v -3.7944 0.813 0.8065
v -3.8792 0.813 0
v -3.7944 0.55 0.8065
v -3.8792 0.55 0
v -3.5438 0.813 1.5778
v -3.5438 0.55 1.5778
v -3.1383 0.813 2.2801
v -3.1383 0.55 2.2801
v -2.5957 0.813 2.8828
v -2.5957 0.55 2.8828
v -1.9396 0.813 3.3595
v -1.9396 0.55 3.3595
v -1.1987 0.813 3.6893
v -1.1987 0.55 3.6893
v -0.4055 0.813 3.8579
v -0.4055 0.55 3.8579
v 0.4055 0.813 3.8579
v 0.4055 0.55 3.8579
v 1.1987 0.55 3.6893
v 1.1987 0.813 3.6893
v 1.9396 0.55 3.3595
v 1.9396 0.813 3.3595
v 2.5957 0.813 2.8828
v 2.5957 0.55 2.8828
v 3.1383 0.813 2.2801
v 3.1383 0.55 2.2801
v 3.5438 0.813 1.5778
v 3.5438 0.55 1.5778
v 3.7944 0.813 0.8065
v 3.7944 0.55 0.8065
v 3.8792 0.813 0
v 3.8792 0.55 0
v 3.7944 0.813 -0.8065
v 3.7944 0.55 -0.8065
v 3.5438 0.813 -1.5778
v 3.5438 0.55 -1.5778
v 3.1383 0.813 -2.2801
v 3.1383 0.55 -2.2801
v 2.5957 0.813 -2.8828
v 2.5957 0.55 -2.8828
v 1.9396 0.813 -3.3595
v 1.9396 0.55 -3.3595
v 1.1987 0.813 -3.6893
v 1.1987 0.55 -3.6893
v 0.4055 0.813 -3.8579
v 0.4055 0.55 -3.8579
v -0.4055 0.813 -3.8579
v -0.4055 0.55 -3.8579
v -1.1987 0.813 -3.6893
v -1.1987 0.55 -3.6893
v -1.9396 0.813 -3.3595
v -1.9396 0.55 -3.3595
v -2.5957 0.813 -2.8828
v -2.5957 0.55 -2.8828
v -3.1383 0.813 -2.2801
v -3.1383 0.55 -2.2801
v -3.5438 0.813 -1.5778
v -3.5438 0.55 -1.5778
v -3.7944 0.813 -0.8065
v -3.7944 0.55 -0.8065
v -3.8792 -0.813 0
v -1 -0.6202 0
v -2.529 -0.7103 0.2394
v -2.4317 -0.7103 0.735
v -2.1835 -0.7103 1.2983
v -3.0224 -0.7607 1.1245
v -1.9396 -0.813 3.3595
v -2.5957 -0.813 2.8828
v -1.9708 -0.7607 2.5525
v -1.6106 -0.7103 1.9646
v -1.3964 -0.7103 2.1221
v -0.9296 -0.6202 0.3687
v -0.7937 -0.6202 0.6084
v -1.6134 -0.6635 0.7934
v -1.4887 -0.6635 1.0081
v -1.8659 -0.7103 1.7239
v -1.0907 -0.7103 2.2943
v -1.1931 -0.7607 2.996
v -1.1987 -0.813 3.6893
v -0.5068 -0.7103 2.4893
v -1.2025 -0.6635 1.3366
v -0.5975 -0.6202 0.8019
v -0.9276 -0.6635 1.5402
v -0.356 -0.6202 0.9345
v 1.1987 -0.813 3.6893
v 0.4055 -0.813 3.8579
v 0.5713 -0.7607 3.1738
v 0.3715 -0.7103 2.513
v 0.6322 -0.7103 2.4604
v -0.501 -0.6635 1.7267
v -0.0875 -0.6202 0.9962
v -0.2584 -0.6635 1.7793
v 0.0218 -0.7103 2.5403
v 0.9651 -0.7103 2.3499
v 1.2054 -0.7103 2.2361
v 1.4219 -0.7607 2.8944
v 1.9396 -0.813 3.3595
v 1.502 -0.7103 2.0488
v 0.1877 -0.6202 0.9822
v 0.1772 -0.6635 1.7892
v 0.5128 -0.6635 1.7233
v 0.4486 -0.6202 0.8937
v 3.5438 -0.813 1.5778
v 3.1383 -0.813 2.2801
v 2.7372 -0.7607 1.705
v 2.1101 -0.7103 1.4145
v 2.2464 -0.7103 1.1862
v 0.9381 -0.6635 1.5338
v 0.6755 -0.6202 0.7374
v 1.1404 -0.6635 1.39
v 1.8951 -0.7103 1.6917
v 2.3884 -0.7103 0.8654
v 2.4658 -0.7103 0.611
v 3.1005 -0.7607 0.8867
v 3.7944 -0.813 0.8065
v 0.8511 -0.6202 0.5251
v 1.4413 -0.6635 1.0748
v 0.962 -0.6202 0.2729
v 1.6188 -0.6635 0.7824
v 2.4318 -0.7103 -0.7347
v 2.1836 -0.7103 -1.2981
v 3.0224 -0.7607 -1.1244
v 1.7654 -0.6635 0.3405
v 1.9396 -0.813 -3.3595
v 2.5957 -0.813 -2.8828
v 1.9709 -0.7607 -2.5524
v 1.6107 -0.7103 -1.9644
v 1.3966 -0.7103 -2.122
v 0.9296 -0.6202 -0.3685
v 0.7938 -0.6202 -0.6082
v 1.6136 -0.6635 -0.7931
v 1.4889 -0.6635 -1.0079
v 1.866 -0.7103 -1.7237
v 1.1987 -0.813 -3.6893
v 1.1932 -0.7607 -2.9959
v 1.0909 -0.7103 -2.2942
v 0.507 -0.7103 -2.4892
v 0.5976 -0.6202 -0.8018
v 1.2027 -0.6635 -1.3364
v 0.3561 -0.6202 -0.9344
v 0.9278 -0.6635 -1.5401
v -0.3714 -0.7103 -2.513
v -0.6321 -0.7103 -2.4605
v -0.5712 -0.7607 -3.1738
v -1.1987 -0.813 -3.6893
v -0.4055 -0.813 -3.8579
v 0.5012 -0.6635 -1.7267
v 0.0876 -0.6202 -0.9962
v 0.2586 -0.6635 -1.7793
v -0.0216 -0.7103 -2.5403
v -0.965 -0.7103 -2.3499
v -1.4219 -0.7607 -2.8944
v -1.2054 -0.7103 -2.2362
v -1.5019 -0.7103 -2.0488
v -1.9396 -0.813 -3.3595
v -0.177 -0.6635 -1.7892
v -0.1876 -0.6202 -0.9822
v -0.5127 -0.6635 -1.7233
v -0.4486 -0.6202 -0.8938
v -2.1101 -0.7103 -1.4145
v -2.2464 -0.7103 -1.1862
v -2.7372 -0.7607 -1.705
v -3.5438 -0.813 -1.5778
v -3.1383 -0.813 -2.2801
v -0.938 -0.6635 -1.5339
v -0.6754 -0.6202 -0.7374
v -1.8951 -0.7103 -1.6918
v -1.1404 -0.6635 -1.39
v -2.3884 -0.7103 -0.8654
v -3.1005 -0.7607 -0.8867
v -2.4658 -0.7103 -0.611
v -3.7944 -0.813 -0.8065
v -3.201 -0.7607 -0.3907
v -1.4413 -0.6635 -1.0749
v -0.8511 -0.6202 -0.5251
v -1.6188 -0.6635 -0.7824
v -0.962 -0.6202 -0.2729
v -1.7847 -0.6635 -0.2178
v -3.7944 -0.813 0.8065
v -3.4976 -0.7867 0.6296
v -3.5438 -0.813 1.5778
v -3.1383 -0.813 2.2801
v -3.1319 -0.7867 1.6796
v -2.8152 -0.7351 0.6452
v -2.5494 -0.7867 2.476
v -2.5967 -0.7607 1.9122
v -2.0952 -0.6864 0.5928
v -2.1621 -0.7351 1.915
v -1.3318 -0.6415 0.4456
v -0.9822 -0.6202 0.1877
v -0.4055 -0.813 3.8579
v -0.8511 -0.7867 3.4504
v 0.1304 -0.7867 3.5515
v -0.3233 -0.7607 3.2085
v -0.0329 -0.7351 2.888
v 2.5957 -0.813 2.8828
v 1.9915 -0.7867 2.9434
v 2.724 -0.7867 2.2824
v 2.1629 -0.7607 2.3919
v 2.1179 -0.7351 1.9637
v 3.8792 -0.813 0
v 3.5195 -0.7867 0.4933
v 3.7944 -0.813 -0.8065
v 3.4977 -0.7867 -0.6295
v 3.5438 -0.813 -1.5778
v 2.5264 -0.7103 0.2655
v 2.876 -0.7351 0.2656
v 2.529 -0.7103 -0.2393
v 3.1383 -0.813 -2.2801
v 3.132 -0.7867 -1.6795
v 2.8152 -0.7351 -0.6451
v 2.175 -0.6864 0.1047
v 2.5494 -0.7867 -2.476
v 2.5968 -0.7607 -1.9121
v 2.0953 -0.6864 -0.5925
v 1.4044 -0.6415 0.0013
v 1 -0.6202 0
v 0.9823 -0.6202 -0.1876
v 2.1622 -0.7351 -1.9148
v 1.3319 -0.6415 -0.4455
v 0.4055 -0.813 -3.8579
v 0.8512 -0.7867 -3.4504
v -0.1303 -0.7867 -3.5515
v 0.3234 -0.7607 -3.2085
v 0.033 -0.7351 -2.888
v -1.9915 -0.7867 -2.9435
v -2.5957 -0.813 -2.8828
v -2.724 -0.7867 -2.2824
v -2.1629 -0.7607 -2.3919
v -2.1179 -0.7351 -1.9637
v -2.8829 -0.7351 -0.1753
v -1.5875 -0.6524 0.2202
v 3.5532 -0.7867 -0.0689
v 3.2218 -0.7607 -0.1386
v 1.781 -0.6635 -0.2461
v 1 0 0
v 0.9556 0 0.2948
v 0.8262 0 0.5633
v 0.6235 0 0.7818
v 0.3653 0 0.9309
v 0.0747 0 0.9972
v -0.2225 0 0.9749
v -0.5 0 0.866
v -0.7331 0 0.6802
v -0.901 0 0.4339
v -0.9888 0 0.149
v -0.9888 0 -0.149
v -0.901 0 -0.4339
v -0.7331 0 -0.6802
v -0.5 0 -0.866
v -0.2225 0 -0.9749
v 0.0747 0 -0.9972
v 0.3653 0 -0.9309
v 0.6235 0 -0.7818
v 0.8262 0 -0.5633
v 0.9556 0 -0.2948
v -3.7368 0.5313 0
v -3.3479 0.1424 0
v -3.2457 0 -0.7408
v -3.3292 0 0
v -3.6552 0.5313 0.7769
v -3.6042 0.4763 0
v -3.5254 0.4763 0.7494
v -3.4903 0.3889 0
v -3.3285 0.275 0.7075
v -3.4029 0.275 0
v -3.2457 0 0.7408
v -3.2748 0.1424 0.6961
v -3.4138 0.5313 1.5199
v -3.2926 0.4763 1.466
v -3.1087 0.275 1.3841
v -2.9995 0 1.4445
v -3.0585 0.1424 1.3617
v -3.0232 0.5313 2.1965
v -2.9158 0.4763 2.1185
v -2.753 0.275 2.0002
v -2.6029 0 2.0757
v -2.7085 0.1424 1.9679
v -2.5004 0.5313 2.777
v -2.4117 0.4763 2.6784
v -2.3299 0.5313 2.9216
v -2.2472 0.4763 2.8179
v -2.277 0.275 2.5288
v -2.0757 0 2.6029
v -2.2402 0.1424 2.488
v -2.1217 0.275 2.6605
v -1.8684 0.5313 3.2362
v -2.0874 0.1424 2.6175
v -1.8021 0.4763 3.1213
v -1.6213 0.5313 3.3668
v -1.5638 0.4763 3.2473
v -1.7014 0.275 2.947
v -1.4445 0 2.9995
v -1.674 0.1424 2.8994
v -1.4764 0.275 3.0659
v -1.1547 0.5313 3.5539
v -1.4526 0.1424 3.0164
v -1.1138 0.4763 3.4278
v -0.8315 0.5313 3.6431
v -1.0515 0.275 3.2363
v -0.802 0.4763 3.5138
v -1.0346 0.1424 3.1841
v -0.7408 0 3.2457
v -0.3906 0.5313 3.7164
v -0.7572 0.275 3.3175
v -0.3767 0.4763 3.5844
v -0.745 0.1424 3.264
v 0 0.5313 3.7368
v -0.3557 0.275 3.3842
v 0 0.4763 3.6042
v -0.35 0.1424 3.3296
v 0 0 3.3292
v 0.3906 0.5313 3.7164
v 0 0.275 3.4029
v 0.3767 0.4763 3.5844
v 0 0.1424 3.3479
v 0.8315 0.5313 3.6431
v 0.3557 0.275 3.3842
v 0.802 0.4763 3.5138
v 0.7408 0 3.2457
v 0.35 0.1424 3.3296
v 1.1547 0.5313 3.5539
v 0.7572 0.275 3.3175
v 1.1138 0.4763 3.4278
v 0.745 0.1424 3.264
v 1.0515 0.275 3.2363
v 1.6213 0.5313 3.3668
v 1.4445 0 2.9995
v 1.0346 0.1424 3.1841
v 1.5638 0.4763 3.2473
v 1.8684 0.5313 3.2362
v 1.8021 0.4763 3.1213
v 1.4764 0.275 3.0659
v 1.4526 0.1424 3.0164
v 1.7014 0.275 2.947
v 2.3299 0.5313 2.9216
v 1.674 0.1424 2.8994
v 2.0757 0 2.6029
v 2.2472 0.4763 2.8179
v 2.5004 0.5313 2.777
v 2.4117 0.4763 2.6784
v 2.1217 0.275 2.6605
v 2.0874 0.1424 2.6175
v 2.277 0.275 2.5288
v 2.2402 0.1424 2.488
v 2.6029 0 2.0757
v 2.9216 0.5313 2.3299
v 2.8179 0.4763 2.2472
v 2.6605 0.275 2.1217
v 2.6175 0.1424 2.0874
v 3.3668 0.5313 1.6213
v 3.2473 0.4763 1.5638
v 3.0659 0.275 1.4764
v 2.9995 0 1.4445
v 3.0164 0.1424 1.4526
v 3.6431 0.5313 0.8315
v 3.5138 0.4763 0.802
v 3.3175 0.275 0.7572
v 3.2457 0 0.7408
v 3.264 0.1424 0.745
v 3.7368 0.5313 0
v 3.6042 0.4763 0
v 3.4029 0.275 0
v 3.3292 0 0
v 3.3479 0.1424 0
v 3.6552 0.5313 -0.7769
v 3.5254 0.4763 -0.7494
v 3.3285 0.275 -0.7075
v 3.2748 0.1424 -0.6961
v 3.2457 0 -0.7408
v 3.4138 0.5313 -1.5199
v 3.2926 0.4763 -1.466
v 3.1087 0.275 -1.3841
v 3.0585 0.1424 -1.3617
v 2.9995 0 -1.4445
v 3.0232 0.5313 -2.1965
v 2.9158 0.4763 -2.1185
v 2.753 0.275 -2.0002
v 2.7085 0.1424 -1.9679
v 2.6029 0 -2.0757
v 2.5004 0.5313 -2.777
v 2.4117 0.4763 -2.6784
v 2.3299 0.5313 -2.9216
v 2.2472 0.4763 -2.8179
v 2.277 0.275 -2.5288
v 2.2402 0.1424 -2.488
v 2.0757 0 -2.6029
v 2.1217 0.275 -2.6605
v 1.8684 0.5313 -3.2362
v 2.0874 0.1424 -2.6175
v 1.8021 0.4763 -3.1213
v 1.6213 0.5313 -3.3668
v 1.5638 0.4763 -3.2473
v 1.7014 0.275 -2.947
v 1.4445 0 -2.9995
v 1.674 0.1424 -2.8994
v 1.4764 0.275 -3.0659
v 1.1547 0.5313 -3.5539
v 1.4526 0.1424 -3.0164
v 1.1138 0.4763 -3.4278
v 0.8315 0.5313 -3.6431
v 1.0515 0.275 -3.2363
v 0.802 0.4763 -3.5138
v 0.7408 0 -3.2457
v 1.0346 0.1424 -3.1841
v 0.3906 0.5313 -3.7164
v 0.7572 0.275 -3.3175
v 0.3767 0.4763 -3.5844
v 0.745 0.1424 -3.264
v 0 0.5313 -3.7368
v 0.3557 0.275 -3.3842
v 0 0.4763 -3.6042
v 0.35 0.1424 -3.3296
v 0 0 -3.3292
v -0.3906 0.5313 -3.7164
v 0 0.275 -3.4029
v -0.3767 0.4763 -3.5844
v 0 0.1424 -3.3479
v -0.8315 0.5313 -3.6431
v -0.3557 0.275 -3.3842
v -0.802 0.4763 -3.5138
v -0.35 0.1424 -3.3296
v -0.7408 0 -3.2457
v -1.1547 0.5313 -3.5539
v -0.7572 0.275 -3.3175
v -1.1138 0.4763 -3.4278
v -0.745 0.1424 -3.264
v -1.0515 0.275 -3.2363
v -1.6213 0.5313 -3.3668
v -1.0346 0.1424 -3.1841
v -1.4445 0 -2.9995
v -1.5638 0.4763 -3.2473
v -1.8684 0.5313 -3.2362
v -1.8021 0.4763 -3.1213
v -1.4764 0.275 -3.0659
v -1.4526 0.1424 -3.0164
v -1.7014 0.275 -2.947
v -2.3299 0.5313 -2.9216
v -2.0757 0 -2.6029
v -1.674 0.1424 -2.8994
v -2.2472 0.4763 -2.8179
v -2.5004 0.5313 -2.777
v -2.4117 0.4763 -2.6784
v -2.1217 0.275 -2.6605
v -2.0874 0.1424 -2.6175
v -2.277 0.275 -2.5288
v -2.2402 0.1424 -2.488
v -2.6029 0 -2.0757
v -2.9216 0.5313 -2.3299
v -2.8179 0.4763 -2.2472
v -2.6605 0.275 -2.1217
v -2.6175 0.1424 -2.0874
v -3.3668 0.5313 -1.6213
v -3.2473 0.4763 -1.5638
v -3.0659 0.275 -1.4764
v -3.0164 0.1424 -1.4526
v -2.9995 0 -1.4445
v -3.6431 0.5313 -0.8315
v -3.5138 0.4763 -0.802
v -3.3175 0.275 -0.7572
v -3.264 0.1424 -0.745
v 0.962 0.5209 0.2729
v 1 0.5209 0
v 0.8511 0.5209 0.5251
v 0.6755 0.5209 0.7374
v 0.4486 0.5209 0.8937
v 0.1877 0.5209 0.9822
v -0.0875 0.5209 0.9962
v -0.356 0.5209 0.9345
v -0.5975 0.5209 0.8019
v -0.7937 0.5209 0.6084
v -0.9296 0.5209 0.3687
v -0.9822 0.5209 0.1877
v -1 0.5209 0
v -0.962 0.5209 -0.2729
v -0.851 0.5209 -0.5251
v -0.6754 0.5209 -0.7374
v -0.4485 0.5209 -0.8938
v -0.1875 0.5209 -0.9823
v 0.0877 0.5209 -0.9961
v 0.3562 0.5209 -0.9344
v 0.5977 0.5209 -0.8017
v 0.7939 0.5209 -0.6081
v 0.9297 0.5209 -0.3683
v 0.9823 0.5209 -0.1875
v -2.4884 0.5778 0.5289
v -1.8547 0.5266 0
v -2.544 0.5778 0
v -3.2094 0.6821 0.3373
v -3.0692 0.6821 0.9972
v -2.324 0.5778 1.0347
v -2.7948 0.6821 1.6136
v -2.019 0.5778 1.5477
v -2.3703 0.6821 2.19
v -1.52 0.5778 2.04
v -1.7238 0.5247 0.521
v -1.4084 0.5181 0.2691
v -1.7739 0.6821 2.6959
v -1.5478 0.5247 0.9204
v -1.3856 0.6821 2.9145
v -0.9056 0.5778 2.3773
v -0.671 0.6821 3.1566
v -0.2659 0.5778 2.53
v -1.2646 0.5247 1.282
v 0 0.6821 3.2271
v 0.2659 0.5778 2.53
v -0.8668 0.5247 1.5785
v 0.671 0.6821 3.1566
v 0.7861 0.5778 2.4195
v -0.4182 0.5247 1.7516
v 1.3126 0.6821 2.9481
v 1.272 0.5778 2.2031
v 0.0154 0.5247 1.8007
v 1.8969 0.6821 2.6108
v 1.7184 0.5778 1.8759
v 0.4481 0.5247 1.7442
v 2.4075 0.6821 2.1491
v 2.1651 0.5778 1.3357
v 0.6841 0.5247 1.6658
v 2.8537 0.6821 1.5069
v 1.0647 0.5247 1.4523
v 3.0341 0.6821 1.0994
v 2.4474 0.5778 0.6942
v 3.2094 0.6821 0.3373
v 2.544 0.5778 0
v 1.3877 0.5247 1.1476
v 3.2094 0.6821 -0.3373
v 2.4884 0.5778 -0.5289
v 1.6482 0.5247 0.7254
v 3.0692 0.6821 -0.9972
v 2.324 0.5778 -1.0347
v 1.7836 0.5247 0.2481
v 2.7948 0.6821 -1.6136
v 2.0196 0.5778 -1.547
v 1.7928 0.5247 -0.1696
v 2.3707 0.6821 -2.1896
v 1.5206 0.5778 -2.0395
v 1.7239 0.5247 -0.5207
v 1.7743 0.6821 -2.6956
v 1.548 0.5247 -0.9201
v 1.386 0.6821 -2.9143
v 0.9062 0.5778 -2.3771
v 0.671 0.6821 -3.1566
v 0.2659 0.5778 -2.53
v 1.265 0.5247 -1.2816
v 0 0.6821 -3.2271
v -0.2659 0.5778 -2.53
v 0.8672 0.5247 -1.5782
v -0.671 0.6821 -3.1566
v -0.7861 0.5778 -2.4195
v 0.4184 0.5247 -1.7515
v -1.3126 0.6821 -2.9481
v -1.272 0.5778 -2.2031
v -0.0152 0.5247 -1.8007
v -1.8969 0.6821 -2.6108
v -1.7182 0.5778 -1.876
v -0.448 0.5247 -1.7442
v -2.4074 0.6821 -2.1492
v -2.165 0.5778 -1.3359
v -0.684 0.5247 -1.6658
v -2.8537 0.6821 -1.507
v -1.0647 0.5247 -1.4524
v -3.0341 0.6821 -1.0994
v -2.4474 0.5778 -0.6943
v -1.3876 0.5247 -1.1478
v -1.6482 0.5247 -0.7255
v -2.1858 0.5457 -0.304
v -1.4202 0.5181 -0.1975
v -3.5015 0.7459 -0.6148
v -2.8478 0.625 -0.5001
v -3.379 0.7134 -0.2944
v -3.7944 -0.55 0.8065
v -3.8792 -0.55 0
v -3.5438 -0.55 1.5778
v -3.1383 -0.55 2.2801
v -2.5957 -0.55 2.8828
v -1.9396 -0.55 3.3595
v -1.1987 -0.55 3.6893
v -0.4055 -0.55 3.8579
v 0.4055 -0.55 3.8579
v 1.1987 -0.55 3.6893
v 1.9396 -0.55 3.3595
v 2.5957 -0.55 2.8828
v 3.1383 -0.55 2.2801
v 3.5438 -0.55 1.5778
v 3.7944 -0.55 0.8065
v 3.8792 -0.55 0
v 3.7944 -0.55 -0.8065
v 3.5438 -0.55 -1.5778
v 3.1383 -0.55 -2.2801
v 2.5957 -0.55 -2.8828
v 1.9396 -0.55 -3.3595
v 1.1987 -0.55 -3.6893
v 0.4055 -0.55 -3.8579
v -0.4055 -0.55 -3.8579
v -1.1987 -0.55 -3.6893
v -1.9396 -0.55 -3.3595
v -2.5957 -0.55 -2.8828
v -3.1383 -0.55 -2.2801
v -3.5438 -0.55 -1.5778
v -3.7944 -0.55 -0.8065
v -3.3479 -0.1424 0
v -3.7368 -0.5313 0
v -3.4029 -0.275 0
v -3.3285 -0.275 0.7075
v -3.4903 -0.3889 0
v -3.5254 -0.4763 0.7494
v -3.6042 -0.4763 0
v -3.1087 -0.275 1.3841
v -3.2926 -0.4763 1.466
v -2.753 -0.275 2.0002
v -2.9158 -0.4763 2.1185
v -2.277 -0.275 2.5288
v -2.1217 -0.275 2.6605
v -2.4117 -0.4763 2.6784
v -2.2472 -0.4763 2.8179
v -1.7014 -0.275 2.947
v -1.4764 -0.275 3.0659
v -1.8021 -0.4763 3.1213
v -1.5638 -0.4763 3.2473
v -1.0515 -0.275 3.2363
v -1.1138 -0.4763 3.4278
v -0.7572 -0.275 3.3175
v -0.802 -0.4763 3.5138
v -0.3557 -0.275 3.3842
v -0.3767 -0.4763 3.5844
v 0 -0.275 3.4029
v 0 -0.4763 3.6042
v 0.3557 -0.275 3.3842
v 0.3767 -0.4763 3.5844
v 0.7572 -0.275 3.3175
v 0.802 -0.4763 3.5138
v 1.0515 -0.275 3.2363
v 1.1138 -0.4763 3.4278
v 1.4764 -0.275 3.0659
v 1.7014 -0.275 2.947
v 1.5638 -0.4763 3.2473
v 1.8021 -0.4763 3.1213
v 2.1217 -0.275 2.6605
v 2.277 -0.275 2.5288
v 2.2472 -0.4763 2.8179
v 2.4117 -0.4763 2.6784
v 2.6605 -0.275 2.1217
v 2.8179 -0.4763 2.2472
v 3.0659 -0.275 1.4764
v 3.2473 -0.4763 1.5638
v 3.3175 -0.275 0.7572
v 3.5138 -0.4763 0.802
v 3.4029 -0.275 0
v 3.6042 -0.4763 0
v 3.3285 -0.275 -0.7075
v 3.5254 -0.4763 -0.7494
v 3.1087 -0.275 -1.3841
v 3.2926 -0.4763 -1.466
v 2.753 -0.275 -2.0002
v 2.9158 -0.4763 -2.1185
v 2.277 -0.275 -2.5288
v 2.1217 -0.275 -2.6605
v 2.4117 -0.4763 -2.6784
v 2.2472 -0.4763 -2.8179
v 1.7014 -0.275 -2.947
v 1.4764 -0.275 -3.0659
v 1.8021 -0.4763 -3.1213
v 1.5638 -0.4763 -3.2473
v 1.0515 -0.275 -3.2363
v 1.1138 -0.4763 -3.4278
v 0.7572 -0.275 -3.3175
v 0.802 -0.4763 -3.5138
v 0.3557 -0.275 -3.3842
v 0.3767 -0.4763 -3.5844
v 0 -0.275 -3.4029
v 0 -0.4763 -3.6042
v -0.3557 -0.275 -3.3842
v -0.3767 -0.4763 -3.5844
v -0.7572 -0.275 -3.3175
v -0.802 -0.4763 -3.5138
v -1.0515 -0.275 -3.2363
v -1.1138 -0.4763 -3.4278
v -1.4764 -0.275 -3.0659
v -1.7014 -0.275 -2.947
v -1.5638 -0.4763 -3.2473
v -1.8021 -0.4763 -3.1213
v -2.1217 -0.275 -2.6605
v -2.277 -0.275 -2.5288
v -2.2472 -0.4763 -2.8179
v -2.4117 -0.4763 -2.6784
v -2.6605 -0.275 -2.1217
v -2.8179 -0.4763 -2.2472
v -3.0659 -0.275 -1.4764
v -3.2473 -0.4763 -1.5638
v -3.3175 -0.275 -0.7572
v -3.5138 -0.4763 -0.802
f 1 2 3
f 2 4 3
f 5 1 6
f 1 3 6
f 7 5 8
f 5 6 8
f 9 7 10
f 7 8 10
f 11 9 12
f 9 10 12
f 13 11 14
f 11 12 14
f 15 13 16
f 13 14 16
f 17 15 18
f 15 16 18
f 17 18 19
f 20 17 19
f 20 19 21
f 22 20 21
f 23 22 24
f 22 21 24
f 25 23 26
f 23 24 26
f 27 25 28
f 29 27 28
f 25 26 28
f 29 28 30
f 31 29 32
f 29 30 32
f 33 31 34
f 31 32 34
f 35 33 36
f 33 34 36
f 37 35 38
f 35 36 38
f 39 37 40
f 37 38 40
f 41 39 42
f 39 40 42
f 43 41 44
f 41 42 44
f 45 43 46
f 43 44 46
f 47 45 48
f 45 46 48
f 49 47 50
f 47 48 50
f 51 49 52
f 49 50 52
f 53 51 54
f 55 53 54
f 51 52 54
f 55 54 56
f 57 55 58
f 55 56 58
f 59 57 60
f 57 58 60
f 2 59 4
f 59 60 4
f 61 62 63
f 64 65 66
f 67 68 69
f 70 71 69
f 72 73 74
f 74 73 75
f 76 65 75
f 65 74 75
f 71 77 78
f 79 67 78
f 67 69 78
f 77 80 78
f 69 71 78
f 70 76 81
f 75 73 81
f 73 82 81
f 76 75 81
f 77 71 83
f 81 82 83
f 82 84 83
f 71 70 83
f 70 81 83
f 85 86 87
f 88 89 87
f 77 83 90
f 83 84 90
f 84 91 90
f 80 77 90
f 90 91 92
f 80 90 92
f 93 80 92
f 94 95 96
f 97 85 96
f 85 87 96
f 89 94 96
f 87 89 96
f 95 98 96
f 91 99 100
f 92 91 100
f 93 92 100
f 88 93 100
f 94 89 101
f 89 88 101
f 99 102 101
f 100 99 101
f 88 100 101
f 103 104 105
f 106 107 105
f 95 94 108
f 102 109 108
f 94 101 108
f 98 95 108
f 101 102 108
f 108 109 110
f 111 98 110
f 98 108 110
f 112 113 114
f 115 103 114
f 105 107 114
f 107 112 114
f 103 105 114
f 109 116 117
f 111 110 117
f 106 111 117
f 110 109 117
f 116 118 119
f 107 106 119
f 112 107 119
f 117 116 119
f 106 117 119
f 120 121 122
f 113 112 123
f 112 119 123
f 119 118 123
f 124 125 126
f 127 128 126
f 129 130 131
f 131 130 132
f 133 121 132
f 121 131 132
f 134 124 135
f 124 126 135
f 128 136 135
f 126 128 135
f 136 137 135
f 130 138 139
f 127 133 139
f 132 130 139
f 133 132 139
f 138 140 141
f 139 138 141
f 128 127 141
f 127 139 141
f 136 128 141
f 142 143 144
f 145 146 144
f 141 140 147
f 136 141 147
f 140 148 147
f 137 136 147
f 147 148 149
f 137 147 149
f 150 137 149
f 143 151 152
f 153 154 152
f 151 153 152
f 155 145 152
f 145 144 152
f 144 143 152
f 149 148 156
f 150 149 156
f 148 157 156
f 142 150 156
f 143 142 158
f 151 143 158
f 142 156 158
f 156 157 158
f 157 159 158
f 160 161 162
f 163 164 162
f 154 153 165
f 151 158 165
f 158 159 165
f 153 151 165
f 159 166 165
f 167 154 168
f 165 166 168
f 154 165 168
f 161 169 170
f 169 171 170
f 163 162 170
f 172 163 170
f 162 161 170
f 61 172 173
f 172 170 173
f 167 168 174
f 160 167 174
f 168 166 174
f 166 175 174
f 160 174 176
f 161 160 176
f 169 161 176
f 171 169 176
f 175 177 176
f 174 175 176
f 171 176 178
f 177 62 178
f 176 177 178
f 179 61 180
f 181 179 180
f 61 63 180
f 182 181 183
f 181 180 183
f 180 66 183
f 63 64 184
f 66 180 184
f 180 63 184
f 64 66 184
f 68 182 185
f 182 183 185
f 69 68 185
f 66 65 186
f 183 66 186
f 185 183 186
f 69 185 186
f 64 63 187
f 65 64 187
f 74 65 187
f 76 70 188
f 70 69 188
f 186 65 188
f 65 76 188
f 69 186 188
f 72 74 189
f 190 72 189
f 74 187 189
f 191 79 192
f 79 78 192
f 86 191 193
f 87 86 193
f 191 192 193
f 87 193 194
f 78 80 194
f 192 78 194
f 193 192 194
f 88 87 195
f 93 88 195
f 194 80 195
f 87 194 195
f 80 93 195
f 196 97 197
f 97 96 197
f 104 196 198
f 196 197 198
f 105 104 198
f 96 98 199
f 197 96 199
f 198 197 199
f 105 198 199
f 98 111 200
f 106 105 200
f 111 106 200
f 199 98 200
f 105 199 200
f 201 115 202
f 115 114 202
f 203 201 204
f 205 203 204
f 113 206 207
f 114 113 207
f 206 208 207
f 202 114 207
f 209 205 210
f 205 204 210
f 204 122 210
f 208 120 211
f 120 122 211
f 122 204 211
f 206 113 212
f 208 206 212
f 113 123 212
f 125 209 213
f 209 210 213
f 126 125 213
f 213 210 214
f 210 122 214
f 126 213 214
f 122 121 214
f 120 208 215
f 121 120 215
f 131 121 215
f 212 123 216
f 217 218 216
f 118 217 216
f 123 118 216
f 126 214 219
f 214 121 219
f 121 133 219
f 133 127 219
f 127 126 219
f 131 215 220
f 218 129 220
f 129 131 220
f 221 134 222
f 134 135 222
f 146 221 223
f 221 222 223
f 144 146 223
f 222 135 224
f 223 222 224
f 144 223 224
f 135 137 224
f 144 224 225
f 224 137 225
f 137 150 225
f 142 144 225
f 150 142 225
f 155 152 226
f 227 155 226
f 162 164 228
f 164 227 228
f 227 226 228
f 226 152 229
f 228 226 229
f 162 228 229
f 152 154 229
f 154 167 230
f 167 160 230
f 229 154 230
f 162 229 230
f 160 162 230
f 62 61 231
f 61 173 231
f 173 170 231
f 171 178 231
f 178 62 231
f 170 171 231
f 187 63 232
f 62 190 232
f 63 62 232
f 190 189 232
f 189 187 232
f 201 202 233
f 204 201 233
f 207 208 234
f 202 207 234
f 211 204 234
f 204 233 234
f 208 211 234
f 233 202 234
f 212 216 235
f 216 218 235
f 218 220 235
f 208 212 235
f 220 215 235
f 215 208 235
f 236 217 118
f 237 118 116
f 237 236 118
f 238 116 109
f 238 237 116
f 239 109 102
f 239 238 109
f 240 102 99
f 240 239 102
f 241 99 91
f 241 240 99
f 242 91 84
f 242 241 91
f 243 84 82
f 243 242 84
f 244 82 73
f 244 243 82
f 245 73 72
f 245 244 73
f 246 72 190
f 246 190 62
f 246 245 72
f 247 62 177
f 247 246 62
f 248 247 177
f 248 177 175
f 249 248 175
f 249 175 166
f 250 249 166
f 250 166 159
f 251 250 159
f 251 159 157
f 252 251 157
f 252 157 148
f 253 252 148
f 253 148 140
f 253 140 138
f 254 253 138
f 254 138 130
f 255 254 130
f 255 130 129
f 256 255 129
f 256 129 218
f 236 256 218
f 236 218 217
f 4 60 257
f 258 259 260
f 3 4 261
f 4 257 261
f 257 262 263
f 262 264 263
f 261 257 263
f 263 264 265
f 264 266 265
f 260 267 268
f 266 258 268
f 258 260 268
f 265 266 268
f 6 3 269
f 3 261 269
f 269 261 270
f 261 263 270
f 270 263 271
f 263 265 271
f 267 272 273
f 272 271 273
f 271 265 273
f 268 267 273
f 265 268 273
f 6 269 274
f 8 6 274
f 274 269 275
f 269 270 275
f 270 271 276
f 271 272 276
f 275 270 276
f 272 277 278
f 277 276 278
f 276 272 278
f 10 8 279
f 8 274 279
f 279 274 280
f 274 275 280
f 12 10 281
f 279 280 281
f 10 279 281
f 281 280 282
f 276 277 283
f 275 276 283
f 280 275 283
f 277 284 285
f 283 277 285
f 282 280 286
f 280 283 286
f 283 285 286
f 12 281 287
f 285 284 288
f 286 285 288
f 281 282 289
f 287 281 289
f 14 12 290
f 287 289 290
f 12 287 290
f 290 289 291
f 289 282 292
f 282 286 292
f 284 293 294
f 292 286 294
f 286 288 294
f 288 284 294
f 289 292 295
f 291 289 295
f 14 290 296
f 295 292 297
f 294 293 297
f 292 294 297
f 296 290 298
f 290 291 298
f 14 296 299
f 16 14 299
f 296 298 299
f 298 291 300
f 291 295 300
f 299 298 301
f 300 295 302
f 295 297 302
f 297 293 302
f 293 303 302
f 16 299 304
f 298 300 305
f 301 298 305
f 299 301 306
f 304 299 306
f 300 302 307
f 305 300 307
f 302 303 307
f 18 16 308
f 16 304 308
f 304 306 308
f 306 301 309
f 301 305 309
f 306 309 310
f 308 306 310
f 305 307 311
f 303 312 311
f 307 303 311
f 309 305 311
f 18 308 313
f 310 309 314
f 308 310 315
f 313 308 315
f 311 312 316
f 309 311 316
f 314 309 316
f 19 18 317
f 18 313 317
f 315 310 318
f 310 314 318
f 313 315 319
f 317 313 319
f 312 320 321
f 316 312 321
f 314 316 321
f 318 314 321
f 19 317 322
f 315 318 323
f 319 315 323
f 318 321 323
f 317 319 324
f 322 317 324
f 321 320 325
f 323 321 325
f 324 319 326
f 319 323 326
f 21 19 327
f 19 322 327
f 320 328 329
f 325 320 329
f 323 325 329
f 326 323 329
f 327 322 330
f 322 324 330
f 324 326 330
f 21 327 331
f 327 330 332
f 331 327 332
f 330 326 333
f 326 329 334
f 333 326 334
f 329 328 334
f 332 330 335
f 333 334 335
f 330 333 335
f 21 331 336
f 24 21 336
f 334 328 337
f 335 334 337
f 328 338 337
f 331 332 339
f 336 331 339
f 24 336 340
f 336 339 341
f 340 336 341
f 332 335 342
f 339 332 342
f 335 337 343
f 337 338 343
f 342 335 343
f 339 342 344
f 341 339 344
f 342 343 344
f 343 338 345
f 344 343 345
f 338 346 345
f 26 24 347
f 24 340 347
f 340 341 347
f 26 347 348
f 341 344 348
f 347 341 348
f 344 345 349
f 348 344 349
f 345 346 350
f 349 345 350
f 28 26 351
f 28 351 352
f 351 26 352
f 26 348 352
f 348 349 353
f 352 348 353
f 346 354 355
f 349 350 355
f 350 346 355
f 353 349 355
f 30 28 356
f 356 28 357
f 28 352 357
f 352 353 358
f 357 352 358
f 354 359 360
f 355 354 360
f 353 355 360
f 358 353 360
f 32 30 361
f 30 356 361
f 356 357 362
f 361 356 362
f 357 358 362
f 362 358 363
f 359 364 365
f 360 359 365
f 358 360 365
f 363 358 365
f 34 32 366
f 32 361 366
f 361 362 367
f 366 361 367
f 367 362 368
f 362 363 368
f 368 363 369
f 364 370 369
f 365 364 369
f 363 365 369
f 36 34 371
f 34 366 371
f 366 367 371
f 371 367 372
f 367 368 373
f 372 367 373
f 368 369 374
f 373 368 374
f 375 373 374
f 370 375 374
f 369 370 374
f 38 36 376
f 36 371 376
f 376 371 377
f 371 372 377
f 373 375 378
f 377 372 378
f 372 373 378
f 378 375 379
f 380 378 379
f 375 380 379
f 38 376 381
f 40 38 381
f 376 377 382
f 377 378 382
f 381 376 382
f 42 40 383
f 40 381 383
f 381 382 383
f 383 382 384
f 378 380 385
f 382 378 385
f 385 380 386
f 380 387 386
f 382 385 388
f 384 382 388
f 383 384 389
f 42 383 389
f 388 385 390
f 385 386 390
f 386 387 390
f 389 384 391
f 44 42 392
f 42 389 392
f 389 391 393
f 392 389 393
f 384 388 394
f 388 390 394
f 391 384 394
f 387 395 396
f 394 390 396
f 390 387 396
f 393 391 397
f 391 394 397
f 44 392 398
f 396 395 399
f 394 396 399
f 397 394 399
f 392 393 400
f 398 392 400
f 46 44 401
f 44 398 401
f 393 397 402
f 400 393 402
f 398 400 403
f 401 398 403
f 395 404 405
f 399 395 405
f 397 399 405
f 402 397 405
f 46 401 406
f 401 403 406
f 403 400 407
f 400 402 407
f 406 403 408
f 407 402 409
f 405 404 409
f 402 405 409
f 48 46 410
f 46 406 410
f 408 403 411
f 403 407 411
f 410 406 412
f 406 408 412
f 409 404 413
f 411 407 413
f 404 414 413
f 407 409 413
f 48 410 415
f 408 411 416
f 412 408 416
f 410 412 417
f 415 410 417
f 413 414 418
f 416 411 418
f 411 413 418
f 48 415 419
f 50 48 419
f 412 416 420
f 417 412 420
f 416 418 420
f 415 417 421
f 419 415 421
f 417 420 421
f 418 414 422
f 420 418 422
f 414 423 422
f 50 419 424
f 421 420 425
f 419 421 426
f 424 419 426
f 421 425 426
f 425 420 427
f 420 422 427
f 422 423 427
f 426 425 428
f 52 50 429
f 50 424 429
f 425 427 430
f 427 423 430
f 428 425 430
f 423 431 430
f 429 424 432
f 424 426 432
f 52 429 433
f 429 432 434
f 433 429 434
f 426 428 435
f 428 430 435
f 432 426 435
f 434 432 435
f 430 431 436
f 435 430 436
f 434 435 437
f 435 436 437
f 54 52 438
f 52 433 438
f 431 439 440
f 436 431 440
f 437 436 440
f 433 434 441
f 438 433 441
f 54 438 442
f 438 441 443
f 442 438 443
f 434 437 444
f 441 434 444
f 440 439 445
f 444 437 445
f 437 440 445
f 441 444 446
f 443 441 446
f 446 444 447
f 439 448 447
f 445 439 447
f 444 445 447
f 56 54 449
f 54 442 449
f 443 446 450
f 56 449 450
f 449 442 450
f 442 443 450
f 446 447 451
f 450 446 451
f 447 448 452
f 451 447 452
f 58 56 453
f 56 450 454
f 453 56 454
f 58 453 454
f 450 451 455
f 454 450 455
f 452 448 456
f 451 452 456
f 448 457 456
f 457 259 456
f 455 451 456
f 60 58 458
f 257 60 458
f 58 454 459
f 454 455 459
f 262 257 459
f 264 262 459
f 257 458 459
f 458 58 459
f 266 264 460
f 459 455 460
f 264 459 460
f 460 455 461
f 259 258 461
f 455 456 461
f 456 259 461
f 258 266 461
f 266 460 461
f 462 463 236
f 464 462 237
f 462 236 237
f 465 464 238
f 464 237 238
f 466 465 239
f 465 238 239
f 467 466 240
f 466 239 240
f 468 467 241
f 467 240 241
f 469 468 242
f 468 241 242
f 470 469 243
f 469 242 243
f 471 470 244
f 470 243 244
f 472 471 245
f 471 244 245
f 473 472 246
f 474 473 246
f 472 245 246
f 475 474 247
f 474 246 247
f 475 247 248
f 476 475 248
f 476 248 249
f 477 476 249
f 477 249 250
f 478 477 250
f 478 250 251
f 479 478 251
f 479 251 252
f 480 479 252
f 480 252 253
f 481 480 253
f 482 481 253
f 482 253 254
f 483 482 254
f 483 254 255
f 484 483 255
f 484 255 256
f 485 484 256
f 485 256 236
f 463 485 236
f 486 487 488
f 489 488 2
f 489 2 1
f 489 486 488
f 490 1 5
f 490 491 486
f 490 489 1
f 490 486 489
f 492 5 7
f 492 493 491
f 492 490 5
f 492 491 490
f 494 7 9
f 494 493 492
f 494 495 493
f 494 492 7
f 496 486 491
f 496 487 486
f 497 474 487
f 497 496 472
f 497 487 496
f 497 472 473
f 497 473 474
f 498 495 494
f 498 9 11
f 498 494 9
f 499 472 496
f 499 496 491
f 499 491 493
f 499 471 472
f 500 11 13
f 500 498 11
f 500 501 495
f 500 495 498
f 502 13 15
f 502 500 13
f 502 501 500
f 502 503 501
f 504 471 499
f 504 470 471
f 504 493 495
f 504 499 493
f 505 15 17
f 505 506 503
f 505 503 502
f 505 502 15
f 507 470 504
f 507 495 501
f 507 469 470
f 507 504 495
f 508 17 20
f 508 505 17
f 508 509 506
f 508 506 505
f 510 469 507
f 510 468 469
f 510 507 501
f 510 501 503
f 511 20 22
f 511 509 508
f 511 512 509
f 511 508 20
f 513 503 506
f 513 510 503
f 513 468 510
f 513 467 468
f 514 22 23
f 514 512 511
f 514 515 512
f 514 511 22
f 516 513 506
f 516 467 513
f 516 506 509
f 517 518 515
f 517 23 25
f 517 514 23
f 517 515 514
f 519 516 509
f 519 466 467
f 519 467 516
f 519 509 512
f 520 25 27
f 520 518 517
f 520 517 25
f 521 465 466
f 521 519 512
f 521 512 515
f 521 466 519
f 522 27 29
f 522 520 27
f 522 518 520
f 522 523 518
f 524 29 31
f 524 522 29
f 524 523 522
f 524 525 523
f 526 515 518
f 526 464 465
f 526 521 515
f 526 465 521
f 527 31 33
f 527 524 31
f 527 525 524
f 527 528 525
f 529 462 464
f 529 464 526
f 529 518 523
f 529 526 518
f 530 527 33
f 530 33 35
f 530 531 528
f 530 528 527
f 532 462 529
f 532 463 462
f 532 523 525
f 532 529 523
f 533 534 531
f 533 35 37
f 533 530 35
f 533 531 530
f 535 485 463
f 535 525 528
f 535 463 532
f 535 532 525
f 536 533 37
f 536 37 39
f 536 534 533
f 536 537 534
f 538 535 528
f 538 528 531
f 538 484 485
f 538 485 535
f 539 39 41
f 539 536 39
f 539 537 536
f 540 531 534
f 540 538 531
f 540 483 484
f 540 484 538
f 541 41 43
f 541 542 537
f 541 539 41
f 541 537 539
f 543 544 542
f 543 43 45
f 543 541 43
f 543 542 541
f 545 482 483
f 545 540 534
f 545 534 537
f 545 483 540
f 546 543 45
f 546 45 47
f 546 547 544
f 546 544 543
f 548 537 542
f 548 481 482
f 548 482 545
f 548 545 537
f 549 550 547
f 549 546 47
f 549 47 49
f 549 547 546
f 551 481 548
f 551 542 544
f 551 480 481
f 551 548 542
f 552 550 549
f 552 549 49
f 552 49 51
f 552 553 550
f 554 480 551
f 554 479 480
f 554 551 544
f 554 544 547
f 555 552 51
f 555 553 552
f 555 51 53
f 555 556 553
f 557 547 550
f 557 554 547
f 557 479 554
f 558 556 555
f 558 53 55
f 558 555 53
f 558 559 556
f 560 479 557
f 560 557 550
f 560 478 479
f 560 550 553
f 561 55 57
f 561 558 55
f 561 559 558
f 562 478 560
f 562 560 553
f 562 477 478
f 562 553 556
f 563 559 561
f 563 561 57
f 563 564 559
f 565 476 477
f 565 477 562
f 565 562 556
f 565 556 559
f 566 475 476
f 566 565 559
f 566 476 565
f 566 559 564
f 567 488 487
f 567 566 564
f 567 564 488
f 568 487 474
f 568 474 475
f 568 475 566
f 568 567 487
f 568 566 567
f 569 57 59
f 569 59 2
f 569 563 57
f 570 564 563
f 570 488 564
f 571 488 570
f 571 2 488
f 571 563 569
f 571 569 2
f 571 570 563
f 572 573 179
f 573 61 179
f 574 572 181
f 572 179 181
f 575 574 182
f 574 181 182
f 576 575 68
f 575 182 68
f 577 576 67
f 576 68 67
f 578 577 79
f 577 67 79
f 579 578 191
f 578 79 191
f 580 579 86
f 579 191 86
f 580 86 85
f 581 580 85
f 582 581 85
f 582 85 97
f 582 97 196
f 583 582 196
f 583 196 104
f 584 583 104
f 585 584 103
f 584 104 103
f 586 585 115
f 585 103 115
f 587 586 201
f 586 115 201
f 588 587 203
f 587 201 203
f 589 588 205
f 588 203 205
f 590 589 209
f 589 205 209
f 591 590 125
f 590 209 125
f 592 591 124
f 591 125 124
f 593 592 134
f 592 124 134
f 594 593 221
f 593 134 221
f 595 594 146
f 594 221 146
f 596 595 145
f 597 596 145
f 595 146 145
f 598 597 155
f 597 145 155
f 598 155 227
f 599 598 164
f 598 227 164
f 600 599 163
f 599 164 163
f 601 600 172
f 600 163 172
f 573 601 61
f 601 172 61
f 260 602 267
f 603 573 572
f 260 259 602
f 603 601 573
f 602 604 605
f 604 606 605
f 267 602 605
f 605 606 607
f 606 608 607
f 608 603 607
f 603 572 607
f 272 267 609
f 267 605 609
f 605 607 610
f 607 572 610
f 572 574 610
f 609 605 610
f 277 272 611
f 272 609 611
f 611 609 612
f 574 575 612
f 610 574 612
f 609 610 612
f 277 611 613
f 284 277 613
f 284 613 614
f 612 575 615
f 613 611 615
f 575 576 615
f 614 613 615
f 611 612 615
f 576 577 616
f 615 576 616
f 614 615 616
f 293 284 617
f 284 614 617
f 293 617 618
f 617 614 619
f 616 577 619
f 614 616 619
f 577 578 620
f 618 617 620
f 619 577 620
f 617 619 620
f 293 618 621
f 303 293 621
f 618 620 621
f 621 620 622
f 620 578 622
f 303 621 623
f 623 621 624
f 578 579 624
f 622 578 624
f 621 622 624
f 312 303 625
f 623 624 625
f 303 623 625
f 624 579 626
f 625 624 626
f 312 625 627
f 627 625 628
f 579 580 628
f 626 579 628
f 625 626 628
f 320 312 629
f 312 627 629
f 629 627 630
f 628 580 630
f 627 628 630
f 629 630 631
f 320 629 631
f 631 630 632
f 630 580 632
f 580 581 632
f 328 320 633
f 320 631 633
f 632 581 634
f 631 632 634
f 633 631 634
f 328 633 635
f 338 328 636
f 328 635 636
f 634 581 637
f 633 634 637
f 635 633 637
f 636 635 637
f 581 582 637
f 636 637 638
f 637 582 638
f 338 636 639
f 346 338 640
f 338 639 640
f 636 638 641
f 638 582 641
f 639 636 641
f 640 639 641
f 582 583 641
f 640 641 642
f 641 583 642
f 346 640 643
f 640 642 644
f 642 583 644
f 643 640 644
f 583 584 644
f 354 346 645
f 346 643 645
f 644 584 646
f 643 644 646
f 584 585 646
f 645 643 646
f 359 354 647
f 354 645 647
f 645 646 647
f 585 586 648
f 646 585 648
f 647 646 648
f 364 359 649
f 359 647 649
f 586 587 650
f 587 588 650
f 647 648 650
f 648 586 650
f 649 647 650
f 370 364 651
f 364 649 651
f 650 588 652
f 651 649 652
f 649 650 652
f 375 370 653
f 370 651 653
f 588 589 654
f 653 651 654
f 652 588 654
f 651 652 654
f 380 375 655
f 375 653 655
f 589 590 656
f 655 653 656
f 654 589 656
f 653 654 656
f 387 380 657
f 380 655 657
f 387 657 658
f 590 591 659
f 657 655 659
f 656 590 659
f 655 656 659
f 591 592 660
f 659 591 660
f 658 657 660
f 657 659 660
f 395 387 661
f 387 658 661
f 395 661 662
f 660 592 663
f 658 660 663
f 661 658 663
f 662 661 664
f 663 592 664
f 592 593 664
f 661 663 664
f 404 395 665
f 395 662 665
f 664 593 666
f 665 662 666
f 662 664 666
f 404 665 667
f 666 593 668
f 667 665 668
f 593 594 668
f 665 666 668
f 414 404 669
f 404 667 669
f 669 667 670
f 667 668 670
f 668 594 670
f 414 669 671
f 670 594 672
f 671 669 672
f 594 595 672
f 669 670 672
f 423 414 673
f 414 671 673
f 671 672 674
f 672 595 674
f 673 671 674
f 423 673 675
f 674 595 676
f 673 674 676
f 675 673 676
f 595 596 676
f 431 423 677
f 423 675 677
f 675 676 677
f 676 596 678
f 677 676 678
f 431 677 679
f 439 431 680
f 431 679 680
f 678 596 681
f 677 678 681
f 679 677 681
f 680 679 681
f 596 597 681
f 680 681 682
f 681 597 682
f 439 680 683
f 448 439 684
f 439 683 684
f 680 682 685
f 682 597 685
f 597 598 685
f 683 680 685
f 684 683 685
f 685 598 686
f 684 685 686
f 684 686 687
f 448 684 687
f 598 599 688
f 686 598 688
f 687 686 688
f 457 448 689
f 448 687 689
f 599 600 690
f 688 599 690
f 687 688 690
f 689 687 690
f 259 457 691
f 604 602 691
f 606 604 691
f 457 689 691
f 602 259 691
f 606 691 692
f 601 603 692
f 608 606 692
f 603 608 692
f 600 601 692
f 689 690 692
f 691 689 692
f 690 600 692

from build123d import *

# Parameters (mm, degrees)
F2_R          = 1
F3_DEPTH      = 9
F3_DEPTH_BACK = 10.2


with BuildPart() as f1:
    # F0 (on Top) → F1 (revolve)
    with BuildSketch(Plane.XY):
        with BuildLine():
            ThreePointArc((-3.3291771512, 0), (-3.4902684216, -0.3889087297), (-3.8791771512, -0.55))
            Line((-3.8791771512, -0.55), (-3.8791771512, -0.8130174247))
            add(Edge.make_bspline(
                [(-3.8791771512, -0.8130174247), (-3.3627895766, -0.7711625564), (-2.2360945011, -0.6798403088), (-0.7856667947, -0.6088802847), (0, -0.5704427022)],
                knots=[0, 0, 0, 0, 0.4583206103, 1, 1, 1, 1], degree=3))
            Line((0, -0.5704427022), (0, 0))
            Line((0, 0), (0, 0.55))
            add(Edge.make_bspline(
                [(-3.8791771512, 0.813), (-3.3637205638, 0.7051800282), (-2.2426051819, 0.4706721533), (-0.7865843545, 0.5221760908), (0, 0.55)],
                knots=[0, 0, 0, 0, 0.4597712206, 1, 1, 1, 1], degree=3))
            Line((-3.8791771512, 0.813), (-3.8791771512, 0.55))
            ThreePointArc((-3.8791771512, 0.55), (-3.4902684216, 0.3889087297), (-3.3291771512, 0))
        make_face()
    revolve(axis=Axis((0, 0.275, 0), (0, 1, 0)))

    # F2 (on Front) → F3 (cut, two sides)
    with BuildSketch(Plane.XZ) as f3_sk:
        Circle(F2_R)
    extrude(amount=-F3_DEPTH, mode=Mode.SUBTRACT)
    extrude(f3_sk.sketch, amount=F3_DEPTH_BACK, mode=Mode.SUBTRACT)


solid = f1.part
